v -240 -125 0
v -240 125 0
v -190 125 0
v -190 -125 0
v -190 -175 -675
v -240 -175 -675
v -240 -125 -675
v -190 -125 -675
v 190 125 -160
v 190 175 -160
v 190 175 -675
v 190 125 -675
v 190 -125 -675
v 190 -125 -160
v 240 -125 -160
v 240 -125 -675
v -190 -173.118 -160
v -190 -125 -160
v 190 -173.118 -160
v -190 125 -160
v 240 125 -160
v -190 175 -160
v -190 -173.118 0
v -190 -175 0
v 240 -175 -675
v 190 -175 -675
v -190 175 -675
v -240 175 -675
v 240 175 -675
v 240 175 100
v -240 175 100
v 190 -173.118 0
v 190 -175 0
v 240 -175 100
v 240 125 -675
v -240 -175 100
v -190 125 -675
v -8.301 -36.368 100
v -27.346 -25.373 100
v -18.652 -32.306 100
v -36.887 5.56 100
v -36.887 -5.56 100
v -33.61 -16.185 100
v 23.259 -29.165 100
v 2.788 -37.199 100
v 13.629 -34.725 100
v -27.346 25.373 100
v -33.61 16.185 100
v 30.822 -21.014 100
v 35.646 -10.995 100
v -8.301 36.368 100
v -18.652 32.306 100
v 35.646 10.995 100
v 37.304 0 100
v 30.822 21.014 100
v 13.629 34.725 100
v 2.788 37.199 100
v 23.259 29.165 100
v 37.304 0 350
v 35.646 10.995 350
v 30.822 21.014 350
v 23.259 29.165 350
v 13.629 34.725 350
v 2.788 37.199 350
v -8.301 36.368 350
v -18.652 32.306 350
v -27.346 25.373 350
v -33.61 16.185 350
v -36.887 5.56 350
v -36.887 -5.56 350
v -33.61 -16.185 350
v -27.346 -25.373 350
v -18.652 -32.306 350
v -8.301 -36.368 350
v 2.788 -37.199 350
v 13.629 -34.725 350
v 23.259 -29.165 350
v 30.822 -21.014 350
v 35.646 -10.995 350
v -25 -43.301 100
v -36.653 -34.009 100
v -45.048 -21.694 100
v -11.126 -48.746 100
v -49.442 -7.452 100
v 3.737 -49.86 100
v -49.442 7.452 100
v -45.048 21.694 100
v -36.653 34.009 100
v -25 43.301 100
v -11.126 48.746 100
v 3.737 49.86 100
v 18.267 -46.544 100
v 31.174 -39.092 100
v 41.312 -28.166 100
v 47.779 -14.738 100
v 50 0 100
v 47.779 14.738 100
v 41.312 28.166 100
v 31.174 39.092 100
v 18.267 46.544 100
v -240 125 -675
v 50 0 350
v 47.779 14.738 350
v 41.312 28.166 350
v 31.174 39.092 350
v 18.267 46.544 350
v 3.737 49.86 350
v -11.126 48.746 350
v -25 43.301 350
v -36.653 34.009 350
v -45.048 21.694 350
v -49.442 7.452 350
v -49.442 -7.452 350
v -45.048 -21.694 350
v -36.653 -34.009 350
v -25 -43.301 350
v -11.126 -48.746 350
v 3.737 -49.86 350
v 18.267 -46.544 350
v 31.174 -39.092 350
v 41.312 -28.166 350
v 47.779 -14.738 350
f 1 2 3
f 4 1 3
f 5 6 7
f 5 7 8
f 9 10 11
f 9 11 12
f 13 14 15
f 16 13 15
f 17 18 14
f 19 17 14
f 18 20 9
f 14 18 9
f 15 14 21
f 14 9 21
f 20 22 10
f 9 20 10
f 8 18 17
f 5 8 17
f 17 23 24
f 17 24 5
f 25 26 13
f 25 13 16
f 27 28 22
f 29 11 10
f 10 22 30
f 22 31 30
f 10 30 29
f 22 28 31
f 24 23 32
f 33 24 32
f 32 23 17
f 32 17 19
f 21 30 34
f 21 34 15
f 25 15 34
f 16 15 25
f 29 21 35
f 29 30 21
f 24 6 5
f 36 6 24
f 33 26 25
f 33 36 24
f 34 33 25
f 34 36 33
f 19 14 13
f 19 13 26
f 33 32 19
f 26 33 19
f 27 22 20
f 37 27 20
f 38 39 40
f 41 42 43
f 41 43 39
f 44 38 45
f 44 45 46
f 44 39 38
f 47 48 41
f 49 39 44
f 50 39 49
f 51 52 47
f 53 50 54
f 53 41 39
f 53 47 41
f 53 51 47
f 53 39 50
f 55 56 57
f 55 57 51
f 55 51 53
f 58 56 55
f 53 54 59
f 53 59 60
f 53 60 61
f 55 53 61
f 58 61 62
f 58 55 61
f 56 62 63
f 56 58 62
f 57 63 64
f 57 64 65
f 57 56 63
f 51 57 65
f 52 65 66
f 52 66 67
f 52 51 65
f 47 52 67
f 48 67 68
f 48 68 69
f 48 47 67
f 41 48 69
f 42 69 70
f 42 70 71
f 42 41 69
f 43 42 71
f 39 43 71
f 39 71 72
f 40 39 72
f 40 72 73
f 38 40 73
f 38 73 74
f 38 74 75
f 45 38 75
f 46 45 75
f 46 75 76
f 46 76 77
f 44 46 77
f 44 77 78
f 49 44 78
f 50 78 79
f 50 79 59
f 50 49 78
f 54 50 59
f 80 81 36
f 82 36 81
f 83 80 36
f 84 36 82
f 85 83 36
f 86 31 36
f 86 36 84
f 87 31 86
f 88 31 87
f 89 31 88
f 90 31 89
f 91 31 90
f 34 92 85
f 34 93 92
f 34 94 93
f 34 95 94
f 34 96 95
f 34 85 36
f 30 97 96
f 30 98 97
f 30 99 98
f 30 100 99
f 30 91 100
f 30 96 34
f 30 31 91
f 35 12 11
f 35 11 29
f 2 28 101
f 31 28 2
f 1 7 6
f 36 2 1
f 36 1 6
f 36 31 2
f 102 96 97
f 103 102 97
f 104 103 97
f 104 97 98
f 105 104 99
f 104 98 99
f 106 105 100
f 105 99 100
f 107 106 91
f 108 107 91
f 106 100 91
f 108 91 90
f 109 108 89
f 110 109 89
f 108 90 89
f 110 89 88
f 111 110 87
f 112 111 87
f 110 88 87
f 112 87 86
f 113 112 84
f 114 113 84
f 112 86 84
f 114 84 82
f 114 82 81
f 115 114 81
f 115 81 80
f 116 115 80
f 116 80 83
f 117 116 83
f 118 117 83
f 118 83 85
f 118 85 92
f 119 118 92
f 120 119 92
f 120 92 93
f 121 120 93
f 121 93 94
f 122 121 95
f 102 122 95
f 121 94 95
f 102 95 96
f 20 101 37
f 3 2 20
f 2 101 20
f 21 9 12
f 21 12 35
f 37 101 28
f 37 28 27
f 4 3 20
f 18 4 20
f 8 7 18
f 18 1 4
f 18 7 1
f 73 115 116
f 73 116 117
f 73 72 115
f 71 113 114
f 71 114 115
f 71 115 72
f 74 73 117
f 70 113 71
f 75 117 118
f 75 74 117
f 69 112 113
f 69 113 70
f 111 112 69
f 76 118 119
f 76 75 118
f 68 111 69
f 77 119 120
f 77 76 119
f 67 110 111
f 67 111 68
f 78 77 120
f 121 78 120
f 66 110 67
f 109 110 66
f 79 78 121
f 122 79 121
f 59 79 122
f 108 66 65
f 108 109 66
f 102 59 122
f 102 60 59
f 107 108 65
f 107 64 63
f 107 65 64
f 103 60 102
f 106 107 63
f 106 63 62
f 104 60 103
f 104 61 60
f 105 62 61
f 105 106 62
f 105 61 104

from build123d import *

# Parameters (mm, degrees)
F0_W      = 480
F0_H      = 350
F1_DEPTH  = 100
F2_W      = 50
F2_H      = 50
F3_DEPTH  = 675
F4_W      = 50
F4_H      = 50
F5_DEPTH  = 675
F6_W      = 50
F6_H      = 50
F7_DEPTH  = 675
F8_W      = 50
F8_H      = 50
F9_DEPTH  = 675
F10_R     = 50
F10_R_2   = 37.3037381585
F11_DEPTH = 250
F14_W     = 430
F14_H     = 139.1179516912
F15_DEPTH = 160
F16_DEPTH = 209
F17_W     = 49.8938559854
F17_H     = 160
F18_DEPTH = 430


# Not quite as in the source:
# - a feature names something its author has since deleted; it is built from what else it names
# - the program builds the solid bodies; features that only make, move or delete a surface that nothing else refers to are left out


with BuildPart() as f1:
    # F0 (on Top) → F1 (new body)
    with BuildSketch(Plane.XY):
        Rectangle(F0_W, F0_H)
    extrude(amount=F1_DEPTH)

    # F2 (on face) → F3 (join)
    with BuildSketch(Plane(origin=(0, 0, 0), x_dir=(1, 0, 0), z_dir=(0, 0, -1))):
        with Locations((215, 150)):
            Rectangle(F2_W, F2_H)
    extrude(amount=F3_DEPTH)

    # F4 (on face) → F5 (join)
    with BuildSketch(Plane(origin=(0, 0, 0), x_dir=(1, 0, 0), z_dir=(0, 0, -1))):
        with Locations((215, -150)):
            Rectangle(F4_W, F4_H)
    extrude(amount=F5_DEPTH)

    # F6 (on face) → F7 (join)
    with BuildSketch(Plane(origin=(0, 0, 0), x_dir=(1, 0, 0), z_dir=(0, 0, -1))):
        with Locations((-215, -150)):
            Rectangle(F6_W, F6_H)
    extrude(amount=F7_DEPTH)

    # F8 (on face) → F9 (join)
    with BuildSketch(Plane(origin=(0, 0, 0), x_dir=(1, 0, 0), z_dir=(0, 0, -1))):
        with Locations((-215, 150)):
            Rectangle(F8_W, F8_H)
    extrude(amount=F9_DEPTH)

    # F10 (on face) → F11 (join)
    with BuildSketch(Plane.XY.offset(100)):
        Circle(F10_R)
        Circle(F10_R_2, mode=Mode.SUBTRACT)
    extrude(amount=F11_DEPTH)

    # F14 (on face) → F15 (join)
    with BuildSketch(Plane(origin=(0, 0, 0), x_dir=(1, 0, 0), z_dir=(0, 0, -1))):
        with Locations((25, -105.4410241544)):
            Rectangle(F14_W, F14_H)
    extrude(amount=F15_DEPTH)

    # F16 (add): a face of the model
    f16_faces = [f1.faces().sort_by_distance(p)[0] for p in [
        (25, 35.8820483088, -80),
    ]]
    extrude(f16_faces, amount=F16_DEPTH)

    # F17 (on face) → F18 (join)
    with BuildSketch(Plane(origin=(-190, 0, 0), x_dir=(0, -1, 0), z_dir=(-1, 0, 0))):
        with Locations((-149.9469279927, -80)):
            Rectangle(F17_W, F17_H)
    extrude(amount=-F18_DEPTH)


solid = f1.part
